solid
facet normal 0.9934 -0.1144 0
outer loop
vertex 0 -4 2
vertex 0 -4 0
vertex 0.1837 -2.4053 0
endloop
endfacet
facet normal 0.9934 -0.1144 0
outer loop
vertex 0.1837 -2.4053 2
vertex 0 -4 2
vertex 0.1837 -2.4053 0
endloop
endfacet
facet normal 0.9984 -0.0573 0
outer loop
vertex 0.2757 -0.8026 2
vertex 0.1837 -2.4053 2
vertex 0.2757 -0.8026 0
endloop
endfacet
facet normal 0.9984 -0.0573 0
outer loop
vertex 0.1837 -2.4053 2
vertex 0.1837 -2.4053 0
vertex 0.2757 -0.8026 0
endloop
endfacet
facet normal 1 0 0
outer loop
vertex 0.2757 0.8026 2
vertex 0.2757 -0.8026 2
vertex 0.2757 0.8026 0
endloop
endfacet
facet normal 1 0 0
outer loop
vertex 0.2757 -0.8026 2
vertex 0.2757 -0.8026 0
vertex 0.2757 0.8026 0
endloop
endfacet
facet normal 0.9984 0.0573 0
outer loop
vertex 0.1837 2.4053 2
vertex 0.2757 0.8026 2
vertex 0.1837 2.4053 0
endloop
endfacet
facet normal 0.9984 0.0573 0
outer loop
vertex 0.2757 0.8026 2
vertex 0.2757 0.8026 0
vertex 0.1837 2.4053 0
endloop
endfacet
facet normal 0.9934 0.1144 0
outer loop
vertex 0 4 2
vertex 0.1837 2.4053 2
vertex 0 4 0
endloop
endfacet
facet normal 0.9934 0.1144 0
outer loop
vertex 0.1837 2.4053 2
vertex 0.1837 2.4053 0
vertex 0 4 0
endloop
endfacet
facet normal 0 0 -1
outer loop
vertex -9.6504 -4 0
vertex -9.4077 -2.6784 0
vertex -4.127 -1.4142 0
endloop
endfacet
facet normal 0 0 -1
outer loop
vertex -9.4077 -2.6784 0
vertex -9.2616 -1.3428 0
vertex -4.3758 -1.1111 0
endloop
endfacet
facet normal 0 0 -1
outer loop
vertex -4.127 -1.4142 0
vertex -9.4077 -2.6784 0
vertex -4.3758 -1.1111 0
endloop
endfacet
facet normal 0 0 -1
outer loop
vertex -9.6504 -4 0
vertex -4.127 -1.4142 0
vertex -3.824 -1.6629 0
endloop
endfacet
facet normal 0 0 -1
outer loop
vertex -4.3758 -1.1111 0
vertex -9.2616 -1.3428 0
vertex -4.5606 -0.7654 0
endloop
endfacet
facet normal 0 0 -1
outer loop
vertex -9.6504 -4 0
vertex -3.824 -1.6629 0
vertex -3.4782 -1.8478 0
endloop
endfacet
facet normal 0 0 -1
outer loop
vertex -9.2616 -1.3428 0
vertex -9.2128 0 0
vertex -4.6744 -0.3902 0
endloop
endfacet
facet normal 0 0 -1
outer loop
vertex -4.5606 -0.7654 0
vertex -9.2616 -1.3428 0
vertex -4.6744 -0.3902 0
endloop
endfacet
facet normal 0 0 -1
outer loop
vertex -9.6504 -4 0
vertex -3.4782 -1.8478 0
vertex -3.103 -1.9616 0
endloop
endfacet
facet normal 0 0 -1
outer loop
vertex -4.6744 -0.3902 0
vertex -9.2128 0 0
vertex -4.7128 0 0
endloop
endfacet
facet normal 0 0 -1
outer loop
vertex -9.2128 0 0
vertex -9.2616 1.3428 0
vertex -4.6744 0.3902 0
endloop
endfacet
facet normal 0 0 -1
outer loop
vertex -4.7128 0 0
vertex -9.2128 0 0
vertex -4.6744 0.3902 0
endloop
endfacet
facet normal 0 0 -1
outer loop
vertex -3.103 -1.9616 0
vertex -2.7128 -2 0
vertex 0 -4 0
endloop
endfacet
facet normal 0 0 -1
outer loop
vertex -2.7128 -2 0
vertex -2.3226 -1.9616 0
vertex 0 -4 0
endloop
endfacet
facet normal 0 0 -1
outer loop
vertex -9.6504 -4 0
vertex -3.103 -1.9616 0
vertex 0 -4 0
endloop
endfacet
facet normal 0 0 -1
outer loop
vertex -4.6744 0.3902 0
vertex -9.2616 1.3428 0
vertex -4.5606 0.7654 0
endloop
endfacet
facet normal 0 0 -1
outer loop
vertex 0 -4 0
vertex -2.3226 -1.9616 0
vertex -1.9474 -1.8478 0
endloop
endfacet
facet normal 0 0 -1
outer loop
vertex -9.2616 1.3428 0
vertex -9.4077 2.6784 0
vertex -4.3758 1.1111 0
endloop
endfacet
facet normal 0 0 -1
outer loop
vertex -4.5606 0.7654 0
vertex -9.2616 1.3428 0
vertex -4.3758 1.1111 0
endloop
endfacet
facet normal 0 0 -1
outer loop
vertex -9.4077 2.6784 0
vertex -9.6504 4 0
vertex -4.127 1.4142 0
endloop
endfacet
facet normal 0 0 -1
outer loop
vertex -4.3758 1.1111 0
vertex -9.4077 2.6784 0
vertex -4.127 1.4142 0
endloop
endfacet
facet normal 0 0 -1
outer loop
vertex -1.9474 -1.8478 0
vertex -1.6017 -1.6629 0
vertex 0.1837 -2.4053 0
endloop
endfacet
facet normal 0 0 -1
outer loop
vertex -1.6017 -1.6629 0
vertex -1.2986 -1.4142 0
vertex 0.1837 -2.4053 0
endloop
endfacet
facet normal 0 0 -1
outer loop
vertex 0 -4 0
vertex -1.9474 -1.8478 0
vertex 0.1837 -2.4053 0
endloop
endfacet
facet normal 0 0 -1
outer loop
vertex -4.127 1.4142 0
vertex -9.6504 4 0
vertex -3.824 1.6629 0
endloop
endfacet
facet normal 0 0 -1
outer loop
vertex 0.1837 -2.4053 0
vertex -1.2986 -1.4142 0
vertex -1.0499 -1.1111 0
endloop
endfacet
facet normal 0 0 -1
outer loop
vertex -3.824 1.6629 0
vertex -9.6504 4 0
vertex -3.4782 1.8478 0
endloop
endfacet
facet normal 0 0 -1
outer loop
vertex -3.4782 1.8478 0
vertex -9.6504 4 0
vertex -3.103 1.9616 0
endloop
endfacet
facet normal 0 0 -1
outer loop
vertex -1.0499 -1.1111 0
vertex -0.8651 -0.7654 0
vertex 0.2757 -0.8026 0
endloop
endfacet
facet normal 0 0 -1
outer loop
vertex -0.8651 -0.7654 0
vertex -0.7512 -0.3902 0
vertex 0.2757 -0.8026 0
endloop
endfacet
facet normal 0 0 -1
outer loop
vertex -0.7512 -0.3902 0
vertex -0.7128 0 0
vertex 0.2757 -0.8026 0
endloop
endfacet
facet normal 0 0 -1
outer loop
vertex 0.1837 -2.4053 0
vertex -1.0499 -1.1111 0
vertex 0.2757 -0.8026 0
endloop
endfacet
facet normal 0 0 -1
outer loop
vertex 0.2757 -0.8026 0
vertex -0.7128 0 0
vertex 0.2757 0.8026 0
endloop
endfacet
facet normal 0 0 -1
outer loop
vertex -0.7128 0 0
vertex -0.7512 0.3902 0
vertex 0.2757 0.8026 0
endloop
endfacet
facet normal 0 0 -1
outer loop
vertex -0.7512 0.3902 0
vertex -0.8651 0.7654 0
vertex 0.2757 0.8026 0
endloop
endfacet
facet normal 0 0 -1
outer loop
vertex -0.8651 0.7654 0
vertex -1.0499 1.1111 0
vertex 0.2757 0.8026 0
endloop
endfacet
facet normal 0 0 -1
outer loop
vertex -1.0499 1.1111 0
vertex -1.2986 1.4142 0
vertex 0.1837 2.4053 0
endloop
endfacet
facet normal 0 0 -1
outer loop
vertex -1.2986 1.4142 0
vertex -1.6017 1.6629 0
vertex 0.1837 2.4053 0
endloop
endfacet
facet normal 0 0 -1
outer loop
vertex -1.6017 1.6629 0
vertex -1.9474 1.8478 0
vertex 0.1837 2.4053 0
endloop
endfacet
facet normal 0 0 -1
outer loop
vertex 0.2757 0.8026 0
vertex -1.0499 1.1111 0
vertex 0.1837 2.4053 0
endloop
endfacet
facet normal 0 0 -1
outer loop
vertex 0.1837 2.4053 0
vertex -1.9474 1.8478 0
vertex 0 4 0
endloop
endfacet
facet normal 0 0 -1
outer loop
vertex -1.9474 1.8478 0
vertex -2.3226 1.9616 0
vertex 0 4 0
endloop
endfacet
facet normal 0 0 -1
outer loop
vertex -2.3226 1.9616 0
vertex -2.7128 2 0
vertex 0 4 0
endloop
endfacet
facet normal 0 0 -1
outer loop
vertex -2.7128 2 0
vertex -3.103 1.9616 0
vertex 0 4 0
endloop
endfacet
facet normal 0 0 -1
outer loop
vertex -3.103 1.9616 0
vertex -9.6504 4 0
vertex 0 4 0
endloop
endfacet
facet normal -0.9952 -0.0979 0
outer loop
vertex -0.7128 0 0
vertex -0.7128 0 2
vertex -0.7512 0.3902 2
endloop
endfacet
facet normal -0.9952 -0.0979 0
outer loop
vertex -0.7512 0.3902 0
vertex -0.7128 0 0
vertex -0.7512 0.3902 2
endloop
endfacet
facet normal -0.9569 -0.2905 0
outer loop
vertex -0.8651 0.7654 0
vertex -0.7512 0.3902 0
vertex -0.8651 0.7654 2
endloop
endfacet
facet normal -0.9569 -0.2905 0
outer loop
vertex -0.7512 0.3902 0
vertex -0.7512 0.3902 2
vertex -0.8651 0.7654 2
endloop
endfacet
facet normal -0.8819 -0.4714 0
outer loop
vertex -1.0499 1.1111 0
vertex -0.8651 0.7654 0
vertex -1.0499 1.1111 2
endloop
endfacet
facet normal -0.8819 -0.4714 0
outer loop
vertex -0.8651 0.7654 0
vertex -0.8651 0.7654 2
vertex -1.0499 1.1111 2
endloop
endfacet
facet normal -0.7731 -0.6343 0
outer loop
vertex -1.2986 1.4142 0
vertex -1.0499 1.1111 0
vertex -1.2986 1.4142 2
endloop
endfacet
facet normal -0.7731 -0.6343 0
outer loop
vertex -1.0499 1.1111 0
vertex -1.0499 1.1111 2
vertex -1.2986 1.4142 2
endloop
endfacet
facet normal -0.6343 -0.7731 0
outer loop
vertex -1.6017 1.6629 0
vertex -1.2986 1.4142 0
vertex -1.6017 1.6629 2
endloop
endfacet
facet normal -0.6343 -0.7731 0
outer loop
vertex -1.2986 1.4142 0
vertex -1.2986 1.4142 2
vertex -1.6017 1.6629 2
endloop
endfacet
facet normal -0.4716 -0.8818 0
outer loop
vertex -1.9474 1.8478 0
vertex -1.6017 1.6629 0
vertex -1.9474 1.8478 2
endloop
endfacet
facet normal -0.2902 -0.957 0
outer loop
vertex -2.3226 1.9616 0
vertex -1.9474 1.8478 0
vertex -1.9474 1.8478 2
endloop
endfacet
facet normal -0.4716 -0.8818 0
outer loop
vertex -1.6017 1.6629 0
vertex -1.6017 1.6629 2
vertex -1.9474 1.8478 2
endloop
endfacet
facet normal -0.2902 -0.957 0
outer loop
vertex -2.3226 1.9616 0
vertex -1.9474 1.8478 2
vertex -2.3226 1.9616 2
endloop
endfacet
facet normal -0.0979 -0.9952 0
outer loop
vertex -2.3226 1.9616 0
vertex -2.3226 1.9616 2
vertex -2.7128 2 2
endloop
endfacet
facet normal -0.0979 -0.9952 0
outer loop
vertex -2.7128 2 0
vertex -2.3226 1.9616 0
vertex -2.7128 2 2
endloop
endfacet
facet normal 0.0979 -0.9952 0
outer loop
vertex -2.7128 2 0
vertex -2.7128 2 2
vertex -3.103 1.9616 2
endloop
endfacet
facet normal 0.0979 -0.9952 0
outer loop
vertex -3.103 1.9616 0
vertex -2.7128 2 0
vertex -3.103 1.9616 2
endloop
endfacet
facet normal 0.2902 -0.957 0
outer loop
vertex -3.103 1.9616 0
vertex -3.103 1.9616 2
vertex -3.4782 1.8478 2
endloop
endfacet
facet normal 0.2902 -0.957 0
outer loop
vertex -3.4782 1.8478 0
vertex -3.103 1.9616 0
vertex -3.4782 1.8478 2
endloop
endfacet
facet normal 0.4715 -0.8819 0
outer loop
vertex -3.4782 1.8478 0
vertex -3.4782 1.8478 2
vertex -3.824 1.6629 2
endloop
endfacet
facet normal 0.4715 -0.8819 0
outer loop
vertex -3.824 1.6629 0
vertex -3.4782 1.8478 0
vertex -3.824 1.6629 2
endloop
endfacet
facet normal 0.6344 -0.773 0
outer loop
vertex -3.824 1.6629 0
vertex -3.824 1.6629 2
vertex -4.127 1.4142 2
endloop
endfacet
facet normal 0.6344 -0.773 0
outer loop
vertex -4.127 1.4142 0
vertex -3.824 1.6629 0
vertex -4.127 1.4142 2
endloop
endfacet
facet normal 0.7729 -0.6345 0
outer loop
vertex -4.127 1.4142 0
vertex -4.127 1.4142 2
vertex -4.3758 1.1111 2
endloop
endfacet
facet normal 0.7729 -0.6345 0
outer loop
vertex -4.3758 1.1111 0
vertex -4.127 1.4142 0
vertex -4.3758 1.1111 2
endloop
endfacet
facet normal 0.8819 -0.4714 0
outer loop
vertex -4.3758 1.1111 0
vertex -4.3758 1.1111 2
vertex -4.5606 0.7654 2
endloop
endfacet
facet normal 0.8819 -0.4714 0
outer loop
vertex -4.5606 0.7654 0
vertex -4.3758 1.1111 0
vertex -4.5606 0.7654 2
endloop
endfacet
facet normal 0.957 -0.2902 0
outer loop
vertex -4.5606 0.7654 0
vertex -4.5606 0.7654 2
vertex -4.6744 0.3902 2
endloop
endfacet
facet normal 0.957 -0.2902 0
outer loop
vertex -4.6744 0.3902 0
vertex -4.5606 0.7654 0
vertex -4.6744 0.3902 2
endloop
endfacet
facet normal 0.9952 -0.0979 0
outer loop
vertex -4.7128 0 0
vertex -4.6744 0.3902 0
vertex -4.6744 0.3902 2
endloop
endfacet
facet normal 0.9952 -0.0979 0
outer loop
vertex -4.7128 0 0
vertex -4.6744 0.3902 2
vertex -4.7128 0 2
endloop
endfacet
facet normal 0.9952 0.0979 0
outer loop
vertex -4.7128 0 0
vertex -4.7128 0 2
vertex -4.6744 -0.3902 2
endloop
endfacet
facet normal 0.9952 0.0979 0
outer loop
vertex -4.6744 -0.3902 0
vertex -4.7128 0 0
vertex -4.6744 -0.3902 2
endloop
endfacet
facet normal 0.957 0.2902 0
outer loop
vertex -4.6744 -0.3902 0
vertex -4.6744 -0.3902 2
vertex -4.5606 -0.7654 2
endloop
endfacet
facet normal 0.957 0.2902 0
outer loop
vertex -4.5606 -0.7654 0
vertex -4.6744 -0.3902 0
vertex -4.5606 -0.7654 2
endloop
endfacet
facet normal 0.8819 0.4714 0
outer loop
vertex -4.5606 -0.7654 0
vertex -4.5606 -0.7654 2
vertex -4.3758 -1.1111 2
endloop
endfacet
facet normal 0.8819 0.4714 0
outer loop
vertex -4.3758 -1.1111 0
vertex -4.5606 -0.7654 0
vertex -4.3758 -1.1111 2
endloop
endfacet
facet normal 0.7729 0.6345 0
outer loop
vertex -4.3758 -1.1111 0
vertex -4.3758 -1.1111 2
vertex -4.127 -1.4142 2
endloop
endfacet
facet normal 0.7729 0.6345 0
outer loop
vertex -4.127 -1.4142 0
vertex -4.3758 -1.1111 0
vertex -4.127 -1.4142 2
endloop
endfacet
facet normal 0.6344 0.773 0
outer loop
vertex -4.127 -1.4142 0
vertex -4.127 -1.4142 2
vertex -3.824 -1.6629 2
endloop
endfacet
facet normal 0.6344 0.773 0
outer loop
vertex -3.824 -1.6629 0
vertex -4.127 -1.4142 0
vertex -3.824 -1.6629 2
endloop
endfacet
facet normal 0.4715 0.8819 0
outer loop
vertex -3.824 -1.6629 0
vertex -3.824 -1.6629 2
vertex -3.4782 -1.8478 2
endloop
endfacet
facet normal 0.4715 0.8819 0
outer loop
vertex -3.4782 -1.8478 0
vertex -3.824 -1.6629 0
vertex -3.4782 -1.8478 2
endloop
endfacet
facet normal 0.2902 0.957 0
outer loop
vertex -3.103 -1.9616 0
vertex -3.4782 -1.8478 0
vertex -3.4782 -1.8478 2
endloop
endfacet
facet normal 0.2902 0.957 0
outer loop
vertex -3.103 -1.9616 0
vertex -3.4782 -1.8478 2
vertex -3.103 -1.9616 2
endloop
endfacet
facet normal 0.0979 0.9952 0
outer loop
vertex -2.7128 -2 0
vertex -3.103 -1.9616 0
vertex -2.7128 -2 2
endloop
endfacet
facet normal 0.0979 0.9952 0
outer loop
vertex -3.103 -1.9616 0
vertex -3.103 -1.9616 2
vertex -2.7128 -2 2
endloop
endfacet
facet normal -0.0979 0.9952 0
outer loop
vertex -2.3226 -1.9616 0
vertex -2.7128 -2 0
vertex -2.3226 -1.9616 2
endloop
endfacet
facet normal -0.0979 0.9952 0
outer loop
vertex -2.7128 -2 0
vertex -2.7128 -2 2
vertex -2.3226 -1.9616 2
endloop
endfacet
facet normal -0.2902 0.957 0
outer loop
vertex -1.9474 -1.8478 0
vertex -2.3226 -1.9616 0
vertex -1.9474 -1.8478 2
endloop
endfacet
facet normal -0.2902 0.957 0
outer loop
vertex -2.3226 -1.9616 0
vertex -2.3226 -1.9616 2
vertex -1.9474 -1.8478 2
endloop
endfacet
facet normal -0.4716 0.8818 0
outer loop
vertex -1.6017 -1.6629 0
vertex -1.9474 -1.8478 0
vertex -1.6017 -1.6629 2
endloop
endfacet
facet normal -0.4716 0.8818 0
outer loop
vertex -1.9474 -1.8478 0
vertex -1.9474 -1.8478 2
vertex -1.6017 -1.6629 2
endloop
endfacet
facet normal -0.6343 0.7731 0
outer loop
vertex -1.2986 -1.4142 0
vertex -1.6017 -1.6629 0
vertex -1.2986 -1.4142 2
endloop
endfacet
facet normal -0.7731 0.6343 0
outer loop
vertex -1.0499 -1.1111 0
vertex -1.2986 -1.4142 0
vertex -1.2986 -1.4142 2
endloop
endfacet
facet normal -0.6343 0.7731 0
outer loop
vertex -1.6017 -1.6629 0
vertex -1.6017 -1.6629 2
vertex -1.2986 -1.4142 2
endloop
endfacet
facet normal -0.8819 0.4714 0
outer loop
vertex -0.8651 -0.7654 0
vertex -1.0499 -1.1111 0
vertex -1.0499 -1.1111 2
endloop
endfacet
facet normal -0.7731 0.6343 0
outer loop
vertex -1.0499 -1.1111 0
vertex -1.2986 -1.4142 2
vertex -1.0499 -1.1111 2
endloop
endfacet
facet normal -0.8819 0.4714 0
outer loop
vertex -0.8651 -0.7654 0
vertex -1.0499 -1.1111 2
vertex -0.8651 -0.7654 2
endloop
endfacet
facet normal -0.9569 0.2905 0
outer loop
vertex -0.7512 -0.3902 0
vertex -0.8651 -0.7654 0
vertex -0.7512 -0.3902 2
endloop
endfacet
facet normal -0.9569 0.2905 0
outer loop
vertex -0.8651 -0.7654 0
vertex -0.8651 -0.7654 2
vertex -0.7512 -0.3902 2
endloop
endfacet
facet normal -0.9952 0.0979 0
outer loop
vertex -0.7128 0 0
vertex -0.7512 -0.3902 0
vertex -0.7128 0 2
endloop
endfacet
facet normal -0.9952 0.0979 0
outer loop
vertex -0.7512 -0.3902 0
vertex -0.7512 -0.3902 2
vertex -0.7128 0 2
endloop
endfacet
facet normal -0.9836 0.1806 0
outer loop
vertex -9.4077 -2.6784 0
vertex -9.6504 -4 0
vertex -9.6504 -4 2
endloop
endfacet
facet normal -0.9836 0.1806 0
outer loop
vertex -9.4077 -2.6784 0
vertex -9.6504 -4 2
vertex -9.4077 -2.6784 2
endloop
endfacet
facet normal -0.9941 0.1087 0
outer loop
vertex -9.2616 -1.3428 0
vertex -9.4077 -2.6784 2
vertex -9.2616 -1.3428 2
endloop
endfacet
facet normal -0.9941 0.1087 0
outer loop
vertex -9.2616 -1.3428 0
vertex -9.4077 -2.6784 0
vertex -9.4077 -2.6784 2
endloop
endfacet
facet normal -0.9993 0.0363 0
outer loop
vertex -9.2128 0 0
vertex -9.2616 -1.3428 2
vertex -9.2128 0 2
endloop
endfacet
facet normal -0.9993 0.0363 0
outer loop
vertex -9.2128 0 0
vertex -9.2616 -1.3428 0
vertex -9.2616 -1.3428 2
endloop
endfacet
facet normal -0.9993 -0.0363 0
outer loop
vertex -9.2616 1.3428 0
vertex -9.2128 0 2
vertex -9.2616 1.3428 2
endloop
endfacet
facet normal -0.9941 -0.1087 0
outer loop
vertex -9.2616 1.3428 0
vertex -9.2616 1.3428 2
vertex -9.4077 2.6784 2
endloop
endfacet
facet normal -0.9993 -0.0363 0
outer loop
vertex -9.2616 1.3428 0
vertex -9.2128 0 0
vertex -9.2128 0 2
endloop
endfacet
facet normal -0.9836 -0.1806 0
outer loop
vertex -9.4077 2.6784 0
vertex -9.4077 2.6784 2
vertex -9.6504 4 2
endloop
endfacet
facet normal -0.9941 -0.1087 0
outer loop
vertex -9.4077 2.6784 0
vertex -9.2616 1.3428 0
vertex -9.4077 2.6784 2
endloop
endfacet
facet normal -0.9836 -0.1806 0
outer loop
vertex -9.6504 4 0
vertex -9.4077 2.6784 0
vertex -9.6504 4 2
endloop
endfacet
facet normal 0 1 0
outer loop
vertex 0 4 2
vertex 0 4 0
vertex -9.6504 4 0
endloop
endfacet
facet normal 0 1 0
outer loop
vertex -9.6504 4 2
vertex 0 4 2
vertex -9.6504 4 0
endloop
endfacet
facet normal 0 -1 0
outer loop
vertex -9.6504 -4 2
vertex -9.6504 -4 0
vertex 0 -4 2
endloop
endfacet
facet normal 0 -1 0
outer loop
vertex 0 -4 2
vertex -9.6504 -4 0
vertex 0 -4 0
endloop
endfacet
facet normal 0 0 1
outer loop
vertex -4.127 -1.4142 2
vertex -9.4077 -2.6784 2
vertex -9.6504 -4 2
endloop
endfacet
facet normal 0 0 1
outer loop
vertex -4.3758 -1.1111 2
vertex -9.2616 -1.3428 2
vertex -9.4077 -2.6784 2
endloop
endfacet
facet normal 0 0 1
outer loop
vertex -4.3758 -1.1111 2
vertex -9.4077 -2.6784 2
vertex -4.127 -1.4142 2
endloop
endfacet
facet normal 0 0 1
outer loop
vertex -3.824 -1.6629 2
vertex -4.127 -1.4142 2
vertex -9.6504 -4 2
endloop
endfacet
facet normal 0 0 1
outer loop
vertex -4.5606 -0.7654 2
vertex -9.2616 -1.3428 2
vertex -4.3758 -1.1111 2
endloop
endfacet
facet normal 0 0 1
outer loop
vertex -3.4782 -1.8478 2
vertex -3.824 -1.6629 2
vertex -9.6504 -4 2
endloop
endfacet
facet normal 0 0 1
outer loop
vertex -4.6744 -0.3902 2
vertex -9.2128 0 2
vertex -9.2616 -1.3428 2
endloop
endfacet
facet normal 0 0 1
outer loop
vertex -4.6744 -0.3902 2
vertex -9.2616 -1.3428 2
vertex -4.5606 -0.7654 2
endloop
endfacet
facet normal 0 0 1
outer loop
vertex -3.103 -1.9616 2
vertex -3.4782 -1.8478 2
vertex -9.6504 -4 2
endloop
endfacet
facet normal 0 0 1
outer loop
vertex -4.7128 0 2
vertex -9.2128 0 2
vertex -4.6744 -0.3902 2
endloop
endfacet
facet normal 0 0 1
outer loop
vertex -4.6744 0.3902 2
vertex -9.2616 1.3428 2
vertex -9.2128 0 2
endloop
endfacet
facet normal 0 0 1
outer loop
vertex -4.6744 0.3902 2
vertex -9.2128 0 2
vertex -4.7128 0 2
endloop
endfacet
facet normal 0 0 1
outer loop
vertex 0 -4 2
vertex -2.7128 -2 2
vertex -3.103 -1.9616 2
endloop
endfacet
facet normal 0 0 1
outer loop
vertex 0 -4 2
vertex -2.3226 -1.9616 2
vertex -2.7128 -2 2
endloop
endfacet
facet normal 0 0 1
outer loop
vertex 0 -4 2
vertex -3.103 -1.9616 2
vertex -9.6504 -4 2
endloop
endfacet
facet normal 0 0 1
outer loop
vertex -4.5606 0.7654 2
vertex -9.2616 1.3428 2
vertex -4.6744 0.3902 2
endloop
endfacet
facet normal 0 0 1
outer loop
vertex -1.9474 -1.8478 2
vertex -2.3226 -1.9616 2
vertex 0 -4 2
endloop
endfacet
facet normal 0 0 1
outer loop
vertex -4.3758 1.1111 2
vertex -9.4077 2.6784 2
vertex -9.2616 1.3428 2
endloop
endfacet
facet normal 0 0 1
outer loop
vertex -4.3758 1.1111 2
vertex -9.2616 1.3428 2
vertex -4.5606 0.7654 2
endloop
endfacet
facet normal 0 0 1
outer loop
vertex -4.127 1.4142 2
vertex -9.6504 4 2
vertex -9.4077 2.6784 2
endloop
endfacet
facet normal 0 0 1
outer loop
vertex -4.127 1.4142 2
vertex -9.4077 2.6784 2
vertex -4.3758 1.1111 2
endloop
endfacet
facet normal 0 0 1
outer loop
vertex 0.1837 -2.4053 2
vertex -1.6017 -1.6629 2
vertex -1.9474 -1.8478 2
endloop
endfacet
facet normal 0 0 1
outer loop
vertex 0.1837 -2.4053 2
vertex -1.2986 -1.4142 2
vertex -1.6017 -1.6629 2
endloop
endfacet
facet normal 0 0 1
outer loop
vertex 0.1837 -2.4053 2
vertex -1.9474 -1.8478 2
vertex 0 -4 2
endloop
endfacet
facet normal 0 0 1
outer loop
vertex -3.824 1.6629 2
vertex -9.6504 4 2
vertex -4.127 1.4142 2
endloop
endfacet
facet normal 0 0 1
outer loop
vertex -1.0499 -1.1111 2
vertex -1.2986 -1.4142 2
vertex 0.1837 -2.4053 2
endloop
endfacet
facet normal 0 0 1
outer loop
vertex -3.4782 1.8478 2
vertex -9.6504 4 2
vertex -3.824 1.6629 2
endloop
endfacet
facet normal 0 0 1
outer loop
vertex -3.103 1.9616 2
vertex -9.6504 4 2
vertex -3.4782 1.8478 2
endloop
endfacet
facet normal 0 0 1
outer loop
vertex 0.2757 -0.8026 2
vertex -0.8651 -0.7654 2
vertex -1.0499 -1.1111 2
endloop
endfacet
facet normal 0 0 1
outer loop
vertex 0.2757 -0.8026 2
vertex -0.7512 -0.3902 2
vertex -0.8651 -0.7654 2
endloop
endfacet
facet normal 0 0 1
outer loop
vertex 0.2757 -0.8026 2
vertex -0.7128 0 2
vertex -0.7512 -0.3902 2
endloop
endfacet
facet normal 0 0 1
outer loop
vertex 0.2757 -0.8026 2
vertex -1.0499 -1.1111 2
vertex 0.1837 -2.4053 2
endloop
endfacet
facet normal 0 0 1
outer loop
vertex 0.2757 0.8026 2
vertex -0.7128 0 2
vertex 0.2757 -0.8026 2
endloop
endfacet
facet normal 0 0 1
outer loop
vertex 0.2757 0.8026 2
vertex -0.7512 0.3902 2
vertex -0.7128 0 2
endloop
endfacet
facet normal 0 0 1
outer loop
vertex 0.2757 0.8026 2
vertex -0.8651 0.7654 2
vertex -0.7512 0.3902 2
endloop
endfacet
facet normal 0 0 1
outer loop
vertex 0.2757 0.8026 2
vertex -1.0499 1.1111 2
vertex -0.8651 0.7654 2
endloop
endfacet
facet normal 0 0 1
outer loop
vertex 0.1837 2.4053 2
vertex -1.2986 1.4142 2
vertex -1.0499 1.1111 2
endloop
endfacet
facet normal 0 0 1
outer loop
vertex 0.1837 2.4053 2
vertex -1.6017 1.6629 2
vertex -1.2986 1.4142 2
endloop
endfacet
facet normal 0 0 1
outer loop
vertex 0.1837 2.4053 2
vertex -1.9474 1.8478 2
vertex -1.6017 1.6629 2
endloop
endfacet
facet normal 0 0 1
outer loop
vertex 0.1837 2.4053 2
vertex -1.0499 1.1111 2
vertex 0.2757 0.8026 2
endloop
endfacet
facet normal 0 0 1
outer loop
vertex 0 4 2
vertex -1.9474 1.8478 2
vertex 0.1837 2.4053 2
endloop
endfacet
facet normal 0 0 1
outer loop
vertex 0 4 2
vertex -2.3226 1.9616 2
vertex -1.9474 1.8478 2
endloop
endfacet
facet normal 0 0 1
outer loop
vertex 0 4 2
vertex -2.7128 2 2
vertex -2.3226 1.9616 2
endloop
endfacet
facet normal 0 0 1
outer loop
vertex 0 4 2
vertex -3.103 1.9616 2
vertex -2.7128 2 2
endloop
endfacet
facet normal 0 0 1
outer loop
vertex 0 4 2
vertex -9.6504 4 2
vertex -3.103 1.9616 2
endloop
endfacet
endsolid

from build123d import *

# Parameters (mm, degrees)
PAD_DEPTH    = 2
SKETCH001_R  = 2
POCKET_DEPTH = 2.001


with BuildPart() as part:
    # Sketch → Pad (new body)
    with BuildSketch(Plane.XY):
        with BuildLine():
            Line((0, 4), (-9.650421, 4))
            ThreePointArc((-9.650421, -4), (-9.212813, 0), (-9.650421, 4))
            Line((-9.650421, -4), (0, -4))
            ThreePointArc((0, -4), (0.287187, 0), (0, 4))
        make_face()
    extrude(amount=PAD_DEPTH)

    # Sketch001 (on Face6 of Pad) → Pocket (cut, through all)
    with BuildSketch(Plane.XY.offset(2)):
        with Locations((-2.712813, 0)):
            Circle(SKETCH001_R)
    extrude(amount=-POCKET_DEPTH, mode=Mode.SUBTRACT)


solid = part.part
